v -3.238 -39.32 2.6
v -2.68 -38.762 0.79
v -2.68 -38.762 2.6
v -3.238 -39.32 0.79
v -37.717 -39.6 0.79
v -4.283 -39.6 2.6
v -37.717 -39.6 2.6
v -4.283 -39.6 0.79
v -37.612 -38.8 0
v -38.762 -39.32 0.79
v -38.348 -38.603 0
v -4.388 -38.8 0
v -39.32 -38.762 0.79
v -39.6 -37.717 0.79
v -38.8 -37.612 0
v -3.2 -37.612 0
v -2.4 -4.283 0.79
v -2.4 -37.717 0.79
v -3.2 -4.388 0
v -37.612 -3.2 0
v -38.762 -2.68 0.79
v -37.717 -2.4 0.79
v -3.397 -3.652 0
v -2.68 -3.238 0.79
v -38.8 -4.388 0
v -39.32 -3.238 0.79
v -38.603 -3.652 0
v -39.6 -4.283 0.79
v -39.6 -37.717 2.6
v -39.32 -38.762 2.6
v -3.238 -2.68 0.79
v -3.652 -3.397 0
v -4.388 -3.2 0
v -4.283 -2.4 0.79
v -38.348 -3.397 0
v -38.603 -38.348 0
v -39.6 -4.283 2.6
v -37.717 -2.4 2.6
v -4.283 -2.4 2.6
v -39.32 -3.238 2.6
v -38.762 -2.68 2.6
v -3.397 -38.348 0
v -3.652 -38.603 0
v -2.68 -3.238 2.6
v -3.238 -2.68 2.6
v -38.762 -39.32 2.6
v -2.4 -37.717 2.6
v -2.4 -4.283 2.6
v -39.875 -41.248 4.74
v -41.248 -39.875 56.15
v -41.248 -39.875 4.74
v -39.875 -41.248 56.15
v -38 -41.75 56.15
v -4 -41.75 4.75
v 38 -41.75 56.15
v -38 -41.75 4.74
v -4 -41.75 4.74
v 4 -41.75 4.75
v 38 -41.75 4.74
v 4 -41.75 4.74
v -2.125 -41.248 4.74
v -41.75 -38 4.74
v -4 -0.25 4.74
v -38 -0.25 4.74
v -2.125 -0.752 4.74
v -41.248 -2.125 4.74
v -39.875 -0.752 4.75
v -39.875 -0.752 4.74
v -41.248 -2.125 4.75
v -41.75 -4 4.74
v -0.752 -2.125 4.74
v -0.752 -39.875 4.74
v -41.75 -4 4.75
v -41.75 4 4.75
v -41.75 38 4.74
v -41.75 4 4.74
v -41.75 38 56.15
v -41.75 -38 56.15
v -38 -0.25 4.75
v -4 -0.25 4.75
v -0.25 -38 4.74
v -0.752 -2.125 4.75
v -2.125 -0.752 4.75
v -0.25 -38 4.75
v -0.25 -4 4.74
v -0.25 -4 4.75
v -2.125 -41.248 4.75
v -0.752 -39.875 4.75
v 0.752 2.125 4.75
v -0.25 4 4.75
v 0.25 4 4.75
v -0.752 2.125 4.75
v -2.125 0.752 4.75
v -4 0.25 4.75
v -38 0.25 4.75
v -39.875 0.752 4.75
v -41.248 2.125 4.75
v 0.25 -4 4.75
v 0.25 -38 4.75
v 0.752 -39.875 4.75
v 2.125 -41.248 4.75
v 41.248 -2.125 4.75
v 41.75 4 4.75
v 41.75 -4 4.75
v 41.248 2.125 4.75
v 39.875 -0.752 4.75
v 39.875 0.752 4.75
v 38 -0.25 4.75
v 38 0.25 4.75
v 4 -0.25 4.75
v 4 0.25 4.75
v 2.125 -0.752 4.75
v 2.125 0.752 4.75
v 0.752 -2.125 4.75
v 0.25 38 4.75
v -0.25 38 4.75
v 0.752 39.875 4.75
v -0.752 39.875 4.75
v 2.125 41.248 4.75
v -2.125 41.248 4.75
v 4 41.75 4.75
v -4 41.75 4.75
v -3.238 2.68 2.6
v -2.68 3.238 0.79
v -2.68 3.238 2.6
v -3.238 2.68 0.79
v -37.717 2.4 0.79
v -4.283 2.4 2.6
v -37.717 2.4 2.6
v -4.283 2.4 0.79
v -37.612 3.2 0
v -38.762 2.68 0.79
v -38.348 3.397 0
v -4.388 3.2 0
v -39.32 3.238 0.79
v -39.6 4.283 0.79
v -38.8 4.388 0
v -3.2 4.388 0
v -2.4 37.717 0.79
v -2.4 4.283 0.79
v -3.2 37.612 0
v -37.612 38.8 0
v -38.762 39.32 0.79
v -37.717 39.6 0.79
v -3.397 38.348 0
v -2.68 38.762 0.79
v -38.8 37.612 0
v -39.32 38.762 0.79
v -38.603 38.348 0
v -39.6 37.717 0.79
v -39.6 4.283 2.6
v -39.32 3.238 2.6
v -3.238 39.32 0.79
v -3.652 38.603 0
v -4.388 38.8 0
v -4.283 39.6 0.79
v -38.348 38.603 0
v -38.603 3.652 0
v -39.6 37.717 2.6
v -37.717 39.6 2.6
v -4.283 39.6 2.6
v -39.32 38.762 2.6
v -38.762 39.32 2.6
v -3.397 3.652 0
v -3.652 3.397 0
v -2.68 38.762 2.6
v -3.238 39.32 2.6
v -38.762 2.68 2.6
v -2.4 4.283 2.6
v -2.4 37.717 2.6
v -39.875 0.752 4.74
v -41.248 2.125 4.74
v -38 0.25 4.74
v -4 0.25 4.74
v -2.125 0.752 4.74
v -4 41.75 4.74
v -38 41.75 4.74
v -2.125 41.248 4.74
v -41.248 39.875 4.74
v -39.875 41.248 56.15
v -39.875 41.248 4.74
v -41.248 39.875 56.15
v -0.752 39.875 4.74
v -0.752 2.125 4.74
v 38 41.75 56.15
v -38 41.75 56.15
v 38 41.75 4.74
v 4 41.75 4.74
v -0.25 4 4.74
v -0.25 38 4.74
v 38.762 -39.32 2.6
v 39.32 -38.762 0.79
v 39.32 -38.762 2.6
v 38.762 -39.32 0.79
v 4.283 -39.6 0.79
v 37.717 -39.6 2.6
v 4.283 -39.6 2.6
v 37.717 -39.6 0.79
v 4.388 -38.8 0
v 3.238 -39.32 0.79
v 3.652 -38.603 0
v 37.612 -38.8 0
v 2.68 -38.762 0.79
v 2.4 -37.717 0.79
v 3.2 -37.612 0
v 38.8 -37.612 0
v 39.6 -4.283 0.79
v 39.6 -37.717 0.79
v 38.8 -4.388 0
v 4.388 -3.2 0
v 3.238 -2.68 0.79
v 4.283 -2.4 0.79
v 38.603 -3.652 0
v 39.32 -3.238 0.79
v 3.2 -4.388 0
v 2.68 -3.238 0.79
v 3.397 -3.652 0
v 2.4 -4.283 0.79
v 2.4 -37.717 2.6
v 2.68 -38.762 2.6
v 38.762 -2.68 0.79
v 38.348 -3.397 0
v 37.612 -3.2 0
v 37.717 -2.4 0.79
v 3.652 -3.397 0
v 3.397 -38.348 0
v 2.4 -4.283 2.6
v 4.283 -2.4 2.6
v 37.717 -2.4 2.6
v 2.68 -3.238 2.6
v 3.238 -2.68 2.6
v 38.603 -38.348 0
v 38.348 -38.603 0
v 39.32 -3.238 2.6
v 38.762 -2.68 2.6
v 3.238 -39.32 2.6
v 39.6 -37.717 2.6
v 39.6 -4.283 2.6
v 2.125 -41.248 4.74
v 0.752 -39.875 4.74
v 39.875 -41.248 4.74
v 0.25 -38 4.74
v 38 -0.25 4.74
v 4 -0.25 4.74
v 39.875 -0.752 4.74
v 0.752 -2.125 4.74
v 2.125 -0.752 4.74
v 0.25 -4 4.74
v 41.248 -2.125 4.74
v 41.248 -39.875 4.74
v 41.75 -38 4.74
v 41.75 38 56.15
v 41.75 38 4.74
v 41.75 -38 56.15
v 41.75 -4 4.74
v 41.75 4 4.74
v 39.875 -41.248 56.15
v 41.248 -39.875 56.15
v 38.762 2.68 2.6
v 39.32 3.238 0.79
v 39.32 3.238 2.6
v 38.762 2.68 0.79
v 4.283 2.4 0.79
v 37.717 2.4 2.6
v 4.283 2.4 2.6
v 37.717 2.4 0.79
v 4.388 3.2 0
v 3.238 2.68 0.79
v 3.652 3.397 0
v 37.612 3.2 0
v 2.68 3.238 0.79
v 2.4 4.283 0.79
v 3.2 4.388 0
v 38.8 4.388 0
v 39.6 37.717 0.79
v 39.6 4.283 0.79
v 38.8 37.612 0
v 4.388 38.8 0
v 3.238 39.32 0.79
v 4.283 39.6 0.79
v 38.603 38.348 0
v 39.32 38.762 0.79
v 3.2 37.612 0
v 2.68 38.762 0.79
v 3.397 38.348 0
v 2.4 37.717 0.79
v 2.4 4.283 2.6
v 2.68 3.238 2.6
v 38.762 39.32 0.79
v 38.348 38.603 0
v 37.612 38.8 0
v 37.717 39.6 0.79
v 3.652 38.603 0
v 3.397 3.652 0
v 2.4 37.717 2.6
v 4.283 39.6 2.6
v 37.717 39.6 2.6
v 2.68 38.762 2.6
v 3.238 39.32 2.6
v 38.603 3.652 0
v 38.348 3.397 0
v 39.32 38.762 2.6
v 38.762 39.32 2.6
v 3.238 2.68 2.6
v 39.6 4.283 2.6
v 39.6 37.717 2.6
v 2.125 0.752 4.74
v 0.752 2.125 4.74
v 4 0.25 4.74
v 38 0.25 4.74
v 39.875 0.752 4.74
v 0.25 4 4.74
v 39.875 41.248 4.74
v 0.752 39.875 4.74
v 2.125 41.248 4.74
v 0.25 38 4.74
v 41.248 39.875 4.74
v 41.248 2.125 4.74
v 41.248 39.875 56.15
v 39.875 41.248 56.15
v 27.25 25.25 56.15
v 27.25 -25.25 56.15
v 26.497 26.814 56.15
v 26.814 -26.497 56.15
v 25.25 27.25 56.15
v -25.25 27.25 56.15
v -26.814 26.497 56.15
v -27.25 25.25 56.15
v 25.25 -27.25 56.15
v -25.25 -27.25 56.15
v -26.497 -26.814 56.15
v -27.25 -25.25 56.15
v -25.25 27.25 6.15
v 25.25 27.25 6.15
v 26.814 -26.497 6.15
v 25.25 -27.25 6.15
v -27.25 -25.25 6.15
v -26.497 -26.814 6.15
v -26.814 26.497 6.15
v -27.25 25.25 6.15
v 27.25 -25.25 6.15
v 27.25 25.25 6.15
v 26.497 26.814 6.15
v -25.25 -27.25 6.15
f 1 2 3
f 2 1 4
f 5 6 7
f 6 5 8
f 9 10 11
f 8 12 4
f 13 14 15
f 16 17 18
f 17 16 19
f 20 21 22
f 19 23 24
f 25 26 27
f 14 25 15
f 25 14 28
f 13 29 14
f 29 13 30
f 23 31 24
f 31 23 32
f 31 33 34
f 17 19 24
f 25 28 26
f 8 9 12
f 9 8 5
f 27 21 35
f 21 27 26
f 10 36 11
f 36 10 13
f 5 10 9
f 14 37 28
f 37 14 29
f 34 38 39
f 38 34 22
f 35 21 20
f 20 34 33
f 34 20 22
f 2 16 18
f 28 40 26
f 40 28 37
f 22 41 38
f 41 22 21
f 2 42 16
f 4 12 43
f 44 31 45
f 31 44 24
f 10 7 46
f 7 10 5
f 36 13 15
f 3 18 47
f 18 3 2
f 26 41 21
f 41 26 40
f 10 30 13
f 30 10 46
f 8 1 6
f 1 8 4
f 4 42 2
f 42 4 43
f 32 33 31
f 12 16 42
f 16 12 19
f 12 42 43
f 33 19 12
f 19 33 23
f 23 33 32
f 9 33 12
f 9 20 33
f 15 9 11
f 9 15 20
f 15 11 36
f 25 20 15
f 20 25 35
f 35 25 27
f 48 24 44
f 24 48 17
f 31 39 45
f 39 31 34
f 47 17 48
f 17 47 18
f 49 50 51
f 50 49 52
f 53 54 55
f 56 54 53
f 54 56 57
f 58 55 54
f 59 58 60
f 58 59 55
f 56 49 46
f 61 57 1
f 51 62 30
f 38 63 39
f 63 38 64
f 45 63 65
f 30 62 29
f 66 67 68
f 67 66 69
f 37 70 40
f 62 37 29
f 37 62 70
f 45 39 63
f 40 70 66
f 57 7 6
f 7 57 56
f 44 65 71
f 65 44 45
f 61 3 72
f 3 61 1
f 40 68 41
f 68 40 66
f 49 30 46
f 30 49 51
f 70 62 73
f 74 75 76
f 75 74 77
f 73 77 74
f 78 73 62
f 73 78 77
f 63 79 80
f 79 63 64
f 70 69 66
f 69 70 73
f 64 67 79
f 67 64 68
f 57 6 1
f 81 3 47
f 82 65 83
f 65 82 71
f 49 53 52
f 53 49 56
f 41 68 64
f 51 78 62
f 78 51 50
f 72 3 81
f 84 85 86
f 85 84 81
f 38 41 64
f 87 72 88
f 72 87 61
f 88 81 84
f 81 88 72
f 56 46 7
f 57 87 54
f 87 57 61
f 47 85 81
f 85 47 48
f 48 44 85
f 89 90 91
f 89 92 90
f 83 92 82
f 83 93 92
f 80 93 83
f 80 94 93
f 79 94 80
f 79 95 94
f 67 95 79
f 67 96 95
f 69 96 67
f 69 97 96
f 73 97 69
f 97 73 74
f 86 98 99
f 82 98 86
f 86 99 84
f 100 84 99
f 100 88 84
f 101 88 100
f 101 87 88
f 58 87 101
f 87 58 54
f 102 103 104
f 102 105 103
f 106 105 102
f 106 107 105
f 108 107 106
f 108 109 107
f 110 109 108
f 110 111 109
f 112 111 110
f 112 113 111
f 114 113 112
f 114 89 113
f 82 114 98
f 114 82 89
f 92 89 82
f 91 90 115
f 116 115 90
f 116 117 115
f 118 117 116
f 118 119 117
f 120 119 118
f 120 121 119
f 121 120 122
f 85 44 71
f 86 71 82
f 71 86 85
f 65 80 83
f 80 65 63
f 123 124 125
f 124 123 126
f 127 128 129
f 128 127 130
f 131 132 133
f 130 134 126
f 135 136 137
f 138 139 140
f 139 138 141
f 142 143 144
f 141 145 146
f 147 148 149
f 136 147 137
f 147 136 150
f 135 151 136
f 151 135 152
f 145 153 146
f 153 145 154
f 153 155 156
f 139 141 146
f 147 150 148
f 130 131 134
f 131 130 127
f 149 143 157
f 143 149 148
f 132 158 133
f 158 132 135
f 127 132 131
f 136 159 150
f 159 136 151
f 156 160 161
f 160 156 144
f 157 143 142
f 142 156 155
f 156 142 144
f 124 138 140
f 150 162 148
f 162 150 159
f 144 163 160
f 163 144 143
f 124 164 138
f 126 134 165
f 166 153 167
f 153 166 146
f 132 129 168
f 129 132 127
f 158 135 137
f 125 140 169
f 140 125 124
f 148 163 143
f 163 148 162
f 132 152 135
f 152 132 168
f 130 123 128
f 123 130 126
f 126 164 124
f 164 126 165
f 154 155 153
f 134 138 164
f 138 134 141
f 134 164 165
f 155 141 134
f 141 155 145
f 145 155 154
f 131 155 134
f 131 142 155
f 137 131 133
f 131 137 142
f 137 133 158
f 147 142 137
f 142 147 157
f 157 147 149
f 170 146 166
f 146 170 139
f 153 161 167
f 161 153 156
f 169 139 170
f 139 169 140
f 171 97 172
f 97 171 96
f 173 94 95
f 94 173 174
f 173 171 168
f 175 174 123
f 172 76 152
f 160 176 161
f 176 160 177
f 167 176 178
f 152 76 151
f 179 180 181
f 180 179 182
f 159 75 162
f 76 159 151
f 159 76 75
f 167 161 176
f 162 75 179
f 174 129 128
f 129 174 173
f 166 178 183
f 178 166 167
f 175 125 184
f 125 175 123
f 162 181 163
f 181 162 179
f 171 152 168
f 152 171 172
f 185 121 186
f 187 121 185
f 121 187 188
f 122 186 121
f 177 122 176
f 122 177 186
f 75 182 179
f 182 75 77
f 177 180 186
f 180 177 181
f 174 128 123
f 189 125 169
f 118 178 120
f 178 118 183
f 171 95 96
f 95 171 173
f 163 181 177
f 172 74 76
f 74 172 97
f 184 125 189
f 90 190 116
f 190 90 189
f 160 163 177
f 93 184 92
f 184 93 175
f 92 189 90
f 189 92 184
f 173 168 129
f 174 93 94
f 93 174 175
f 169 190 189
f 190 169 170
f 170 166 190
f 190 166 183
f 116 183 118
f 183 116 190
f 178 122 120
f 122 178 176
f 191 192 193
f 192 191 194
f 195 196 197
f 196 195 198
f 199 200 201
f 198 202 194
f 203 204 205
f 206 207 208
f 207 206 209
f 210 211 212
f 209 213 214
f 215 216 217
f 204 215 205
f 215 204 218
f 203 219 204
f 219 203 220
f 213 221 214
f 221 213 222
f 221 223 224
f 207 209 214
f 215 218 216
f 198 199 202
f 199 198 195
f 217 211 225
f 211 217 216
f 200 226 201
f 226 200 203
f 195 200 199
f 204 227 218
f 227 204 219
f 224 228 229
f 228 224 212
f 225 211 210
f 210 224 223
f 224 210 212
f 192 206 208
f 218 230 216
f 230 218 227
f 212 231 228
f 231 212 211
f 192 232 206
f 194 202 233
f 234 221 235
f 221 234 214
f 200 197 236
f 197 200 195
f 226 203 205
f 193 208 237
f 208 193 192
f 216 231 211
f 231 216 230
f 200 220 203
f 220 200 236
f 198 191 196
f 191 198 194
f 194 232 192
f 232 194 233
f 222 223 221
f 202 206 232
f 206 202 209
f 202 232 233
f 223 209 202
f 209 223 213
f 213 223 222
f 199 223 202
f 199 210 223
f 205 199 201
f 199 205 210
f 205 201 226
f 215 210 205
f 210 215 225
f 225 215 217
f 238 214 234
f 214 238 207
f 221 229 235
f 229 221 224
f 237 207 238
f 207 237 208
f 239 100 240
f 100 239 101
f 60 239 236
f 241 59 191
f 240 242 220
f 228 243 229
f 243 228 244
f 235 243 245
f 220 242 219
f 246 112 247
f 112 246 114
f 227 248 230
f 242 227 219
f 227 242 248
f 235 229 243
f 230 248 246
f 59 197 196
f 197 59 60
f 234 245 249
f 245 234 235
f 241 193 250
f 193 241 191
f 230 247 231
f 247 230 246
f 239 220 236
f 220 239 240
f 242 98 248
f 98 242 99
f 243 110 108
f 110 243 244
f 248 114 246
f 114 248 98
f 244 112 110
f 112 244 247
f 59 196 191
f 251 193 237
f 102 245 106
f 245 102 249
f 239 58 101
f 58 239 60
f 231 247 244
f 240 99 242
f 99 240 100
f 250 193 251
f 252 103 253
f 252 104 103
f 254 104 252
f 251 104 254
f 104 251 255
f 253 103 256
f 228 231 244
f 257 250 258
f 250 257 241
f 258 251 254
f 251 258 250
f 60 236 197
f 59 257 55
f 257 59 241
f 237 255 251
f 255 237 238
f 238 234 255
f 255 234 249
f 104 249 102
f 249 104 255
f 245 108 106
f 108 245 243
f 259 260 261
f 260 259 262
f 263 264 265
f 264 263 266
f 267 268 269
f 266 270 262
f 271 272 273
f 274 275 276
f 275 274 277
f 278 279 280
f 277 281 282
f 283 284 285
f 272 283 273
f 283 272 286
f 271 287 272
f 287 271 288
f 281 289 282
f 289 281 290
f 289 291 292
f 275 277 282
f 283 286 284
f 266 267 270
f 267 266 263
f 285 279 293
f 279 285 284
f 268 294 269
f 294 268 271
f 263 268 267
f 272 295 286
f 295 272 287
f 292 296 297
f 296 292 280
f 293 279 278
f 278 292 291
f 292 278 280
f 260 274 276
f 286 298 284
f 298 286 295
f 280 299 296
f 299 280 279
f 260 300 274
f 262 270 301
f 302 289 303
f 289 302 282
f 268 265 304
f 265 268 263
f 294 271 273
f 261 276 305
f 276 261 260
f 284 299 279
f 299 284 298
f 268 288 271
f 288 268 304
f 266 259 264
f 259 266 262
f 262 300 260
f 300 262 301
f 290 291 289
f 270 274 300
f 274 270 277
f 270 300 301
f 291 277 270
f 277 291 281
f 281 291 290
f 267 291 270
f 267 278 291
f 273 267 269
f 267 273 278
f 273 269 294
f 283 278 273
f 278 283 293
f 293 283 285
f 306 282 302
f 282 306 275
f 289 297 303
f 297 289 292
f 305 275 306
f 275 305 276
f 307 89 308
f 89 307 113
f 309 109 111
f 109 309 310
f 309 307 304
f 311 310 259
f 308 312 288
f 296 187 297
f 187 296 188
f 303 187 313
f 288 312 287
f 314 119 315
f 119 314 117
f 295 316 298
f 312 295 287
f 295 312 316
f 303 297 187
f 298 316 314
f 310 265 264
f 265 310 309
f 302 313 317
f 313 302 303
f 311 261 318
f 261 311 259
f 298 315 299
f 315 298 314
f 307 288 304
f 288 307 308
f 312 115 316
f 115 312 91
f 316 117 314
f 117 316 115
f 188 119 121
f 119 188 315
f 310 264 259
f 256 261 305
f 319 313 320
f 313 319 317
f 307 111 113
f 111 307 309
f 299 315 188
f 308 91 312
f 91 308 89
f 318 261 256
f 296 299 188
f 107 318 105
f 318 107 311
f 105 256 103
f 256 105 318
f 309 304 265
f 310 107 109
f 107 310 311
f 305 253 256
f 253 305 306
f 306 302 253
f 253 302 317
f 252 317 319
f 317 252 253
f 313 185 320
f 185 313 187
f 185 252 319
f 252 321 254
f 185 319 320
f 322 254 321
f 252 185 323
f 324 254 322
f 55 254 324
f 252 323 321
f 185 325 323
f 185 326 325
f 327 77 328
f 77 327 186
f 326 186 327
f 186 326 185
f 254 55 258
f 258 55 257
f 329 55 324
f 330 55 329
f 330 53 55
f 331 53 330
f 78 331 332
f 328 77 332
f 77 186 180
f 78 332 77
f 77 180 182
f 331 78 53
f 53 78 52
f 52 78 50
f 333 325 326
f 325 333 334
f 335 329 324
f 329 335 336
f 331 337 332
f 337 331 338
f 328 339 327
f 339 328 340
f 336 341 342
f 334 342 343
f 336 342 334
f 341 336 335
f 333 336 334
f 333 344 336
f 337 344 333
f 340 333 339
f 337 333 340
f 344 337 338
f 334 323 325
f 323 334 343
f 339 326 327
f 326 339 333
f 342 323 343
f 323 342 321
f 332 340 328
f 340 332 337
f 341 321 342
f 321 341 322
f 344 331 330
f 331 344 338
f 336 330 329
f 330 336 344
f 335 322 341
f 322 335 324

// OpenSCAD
// file: ../lib/vessel.scad
// SPDX-License-Identifier: MIT
// Copyright (c) 2026 Aaron Cupp
//
// vessel.scad — parametric collar cups for bottles, cans, and pen-form tools.
//
// A collar cup is a solid Gridfinity block with cylindrical bores sunk into it.
// It LOCATES a vessel; it does not clamp one. That distinction is the whole
// design: a collar that grips harder than the bin weighs comes out of the
// baseplate with the bottle when you grab it one-handed. Clearance, not
// interference — CLR is per-diameter, not per-side.
//
// Capture depth is roughly a third of the vessel's height. Enough to resist a
// knock (this bench sits under a 180 W fume-extractor intake), not so much that
// you're fishing the bottle out.
//
//   collar_cup(nx, ny, vessel_d, capture_h, …)   — one centred bore
//   collar_cup_multi(nx, ny, bores, capture_h, …) — bores = [[x, y, d], …]
//
// Cord slot: pen-form tools that stand in a cup are usually corded (the HARDELL
// rotary tool takes a barrel jack). Without a slot the lead drapes over the rim
// and levers the tool sideways. `cord_w > 0` cuts a channel from the bore out
// through the wall, open to the top.

include <gridfinity.scad>

CLR      = 1.0;   // bore = vessel_d + CLR. Loose on purpose — see above.
MIN_WALL = 1.2;   // minimum material between two bores, and bore to outer face

// ---- geometry guards ----
// Overlapping bores and bores that break out through the side wall both still
// render as perfectly watertight, 2-manifold meshes — CI cannot tell you the
// part is wrong, only that it is closed. These asserts encode the intent that
// the mesh check can't. Cheap, and they fire at render time rather than on the
// printer.
function _pair_gaps(bores, clr) = [
    for (i = [0 : len(bores)-1], j = [0 : len(bores)-1]) if (i < j)
        norm([bores[i][0]-bores[j][0], bores[i][1]-bores[j][1]])
        - (bores[i][2]+clr)/2 - (bores[j][2]+clr)/2
];
function _edge_gaps(bores, clr, W, D) = [
    for (b = bores) min(W/2 - abs(b[0]) - (b[2]+clr)/2,
                        D/2 - abs(b[1]) - (b[2]+clr)/2)
];

// Multi-bore block. Bores are [x, y, diameter] in mm, relative to the block centre.
module collar_cup_multi(nx, ny, bores, capture_h, floor = 1.4, clr = CLR,
                        cord_w = 0, cord_at = 0, min_wall = MIN_WALL) {
    h = BIN_BASE_H + floor + capture_h;
    e = 0.1;
    W = nx*GF - 0.5; D = ny*GF - 0.5;
    _pg = _pair_gaps(bores, clr);
    _eg = _edge_gaps(bores, clr, W, D);
    assert(len(_pg) == 0 || min(_pg) >= min_wall,
           "collar_cup: bores are too close — they would merge into one pocket");
    assert(min(_eg) >= min_wall,
           "collar_cup: a bore breaches the outer wall — block needs more units");
    difference() {
        bin_blank(nx, ny, h);
        for (b = bores)
            translate([b[0], b[1], BIN_BASE_H + floor])
                cylinder(d = b[2] + clr, h = capture_h + e, $fn = 96);
        // Cord channel: from the first bore outward through the +X wall, open to
        // the rim so the lead drops in from above rather than threading.
        if (cord_w > 0)
            translate([bores[0][0], bores[0][1] - cord_w/2, BIN_BASE_H + floor + cord_at])
                cube([nx*GF, cord_w, h]);
    }
}

// Single centred bore — the common case.
module collar_cup(nx, ny, vessel_d, capture_h, floor = 1.4, clr = CLR,
                  cord_w = 0, cord_at = 0, min_wall = MIN_WALL) {
    collar_cup_multi(nx, ny, [[0, 0, vessel_d]], capture_h, floor, clr,
                     cord_w, cord_at, min_wall);
}

// Evenly spaced row of same-depth bores along X — for a rank of aerosol cans.
// Returns geometry, not a list; pass the diameters and it lays them out on the
// block's centre line.
module collar_cup_row(nx, ny, diameters, capture_h, floor = 1.4, clr = CLR,
                      min_wall = MIN_WALL) {
    n = len(diameters);
    pitch = nx * GF / n;
    collar_cup_multi(nx, ny,
        [for (i = [0 : n-1]) [(i - (n-1)/2) * pitch, 0, diameters[i]]],
        capture_h, floor, clr, 0, 0, min_wall);
}
// file: cleaning_station_common.scad
// cleaning_station_common.scad — shared parameters for the bench cleaning station.
//
// The IPA / contact-cleaner corner of the electronics repair bench. Everything
// here is measured off the actual items with calipers; nothing is a nominal from
// a product page. Diameters carry a per-diameter clearance (lib/vessel.scad CLR),
// not per-side.
//
// This corner sits under a fume-extractor intake, which drives two decisions:
//   * Cups CAPTURE the vessel rather than clamp it — a collar that grips harder
//     than the bin weighs lifts out of the baseplate with the bottle.
//   * Bins stay as low as the job allows. Capture velocity is decided in the
//     first six inches, and a wall of tall bins in front of the hood costs it.
//
// The aerosols are FLAMMABLE and this bench has a 400 °C iron on it. These cups
// are for working cans only; bulk stock belongs away from the hood entirely.
//
// SPDX-License-Identifier: CC-BY-NC-SA-4.0
// Copyright (c) 2026 Aaron Cupp

include <../lib/vessel.scad>

// ---- measured diameters (mm) ----
// DeoxIT bore: taken from the PART, not from a can measurement.
//
// The 2026-08-20 print had three bores — 57.00 / 55.20 / 52.75. The 57.00 fits a
// DeoxIT; 55.20 barely does; 52.75 holds nothing. So 57.00 is a validated bore,
// which beats re-deriving it from a can diameter plus a clearance guess. D5, F5
// and G5 are the same can, so one bore serves all three.
BORE_DEOXIT = 57.00;   // ✅ proven by the printed part

// Freeze spray is a DIFFERENT, LARGER can — 13 mm wider than a DeoxIT, which is
// why it never fitted a shared block.
D_FREEZE_SPRAY = 69.00;   // ✅ measured 2026-08-20 (was 56.00, badly wrong)
FREEZE_CLR     = 2.0;     // [1:0.5:4] -> 71.00 bore
FREEZE_MEASURED = true;

D_DISPENSER    = 53.50;   // 200 ml push-down alcohol pump, square base across flats
D_FLOOD_BOTTLE = 75.50;

// DeoxIT D100 / F100 / G100 concentrate droppers — bare bottles, out of their
// kit boxes. The boxes are a full 2×1 EACH; the three bare bottles share one.
// NOT ROUND — 39 × 20 is a flattened cross-section, not a diameter and a height.
D_DROPPER_L = 39.00;   // measured 2026-08-20, long axis of the footprint
D_DROPPER_W = 20.00;   // measured, short axis
DROPPER_CLR = 1.00;    // per dimension, matching the CLR convention
CAP_DROPPER = 26;      // [8:1:40] capture depth. ⚠️ bottle HEIGHT is unmeasured —
                       //   39 turned out to be a footprint, so the height nobody
                       //   has taken.
                       //   RAISED 15 → 26 on 2026-08-24: at 15 the brushes and
                       //   swabs fell over in their slots. Depth is what resists
                       //   an applicator tipping, and 15 mm of it on a ~100 mm
                       //   brush is almost none. 26 makes the whole block half
                       //   again as tall, which is what was asked for.
                       //   Read the bin_deoxit_droppers header before assuming
                       //   this alone fixes the tipping — it does not.

// ---- melamine sponges (mm) — 3.94 × 2.35 × 0.79 in ----
// Full block as sold. Bulk stock lives in the bag under the desk, ~100 of them;
// none of it competes for grid.
SPONGE_L = 100.1; SPONGE_W = 59.7; SPONGE_T = 20.1;

// WORKING size: a full block is far more sponge than any bench task needs, and
// melamine is consumed by abrasion — quartering one gets four uses out of what
// was one, and the smaller piece reaches between connectors where a 100 mm block
// cannot. Halve across, halve lengthwise.
CUT_L = SPONGE_L / 2;   // 50.05
CUT_W = SPONGE_W / 2;   // 29.85
CUT_T = SPONGE_T;       // 20.1 — unchanged, cuts are through the face

// ---- capture depth ----
// Vessel HEIGHTS were not measured, so this is a judgement call rather than a
// derived third-of-height: 50 mm resists a knock without making the bottles a
// two-handed retrieval. One number to change if the first print feels wrong.
CAPTURE = 50;

// Sponge bin: sponges stand ON EDGE (60 mm tall), ~4 across the 81 mm interior.
// On edge beats flat-stacked — same count in a 68 mm bin instead of a 107 mm one,
// and any sponge can be pinched out rather than peeling off the top of a pile.
// Height is set by a FULL block standing on edge, not a cut one — so one uncut
// block can still ride in the bin as reserve alongside the trimmed pieces.
// Cut pieces are 50 long, which is what lets the footprint drop to 2×2.
SPONGE_BIN_H = SPONGE_W + BIN_BASE_H + 1.4 + 2;   // ≈ 68
// main file
// bin_dispenser — 2×2 cup for one 200 ml push-down IPA pump.
//
// The bottle is SQUARE. This used collar_cup(), which only bores cylinders, so
// a 53.50 mm square base was cut as a 53.50 mm round hole — the bottle's corners
// foul the bore by ~11 mm a side and it never seats. The measurement was right
// and the shape was wrong.
//
// POCKET_R is deliberately small: the pocket only accepts the bottle if its own
// corners are no rounder than the bottle's. 2 mm suits any bottle with a corner
// radius of 2 mm or more, which is effectively all of them.
//
// PRINT: as emitted, feet down. No supports.
//
// SPDX-License-Identifier: CC-BY-NC-SA-4.0
// Copyright (c) 2026 Aaron Cupp
include <cleaning_station_common.scad>
include <../lib/gridfinity.scad>

POCKET_R = 2.0;   // [0.5:0.5:6] pocket corner radius — keep <= the bottle's
CLR      = 1.0;   // across flats, matching lib/vessel.scad's convention

h = BIN_BASE_H + 1.4 + CAPTURE;
s = D_DISPENSER + CLR;

difference() {
    bin_blank(2, 2, h);
    translate([0, 0, BIN_BASE_H + 1.4])
        linear_extrude(CAPTURE + 0.1)
            offset(POCKET_R) offset(-POCKET_R) square([s, s], center = true);
}
